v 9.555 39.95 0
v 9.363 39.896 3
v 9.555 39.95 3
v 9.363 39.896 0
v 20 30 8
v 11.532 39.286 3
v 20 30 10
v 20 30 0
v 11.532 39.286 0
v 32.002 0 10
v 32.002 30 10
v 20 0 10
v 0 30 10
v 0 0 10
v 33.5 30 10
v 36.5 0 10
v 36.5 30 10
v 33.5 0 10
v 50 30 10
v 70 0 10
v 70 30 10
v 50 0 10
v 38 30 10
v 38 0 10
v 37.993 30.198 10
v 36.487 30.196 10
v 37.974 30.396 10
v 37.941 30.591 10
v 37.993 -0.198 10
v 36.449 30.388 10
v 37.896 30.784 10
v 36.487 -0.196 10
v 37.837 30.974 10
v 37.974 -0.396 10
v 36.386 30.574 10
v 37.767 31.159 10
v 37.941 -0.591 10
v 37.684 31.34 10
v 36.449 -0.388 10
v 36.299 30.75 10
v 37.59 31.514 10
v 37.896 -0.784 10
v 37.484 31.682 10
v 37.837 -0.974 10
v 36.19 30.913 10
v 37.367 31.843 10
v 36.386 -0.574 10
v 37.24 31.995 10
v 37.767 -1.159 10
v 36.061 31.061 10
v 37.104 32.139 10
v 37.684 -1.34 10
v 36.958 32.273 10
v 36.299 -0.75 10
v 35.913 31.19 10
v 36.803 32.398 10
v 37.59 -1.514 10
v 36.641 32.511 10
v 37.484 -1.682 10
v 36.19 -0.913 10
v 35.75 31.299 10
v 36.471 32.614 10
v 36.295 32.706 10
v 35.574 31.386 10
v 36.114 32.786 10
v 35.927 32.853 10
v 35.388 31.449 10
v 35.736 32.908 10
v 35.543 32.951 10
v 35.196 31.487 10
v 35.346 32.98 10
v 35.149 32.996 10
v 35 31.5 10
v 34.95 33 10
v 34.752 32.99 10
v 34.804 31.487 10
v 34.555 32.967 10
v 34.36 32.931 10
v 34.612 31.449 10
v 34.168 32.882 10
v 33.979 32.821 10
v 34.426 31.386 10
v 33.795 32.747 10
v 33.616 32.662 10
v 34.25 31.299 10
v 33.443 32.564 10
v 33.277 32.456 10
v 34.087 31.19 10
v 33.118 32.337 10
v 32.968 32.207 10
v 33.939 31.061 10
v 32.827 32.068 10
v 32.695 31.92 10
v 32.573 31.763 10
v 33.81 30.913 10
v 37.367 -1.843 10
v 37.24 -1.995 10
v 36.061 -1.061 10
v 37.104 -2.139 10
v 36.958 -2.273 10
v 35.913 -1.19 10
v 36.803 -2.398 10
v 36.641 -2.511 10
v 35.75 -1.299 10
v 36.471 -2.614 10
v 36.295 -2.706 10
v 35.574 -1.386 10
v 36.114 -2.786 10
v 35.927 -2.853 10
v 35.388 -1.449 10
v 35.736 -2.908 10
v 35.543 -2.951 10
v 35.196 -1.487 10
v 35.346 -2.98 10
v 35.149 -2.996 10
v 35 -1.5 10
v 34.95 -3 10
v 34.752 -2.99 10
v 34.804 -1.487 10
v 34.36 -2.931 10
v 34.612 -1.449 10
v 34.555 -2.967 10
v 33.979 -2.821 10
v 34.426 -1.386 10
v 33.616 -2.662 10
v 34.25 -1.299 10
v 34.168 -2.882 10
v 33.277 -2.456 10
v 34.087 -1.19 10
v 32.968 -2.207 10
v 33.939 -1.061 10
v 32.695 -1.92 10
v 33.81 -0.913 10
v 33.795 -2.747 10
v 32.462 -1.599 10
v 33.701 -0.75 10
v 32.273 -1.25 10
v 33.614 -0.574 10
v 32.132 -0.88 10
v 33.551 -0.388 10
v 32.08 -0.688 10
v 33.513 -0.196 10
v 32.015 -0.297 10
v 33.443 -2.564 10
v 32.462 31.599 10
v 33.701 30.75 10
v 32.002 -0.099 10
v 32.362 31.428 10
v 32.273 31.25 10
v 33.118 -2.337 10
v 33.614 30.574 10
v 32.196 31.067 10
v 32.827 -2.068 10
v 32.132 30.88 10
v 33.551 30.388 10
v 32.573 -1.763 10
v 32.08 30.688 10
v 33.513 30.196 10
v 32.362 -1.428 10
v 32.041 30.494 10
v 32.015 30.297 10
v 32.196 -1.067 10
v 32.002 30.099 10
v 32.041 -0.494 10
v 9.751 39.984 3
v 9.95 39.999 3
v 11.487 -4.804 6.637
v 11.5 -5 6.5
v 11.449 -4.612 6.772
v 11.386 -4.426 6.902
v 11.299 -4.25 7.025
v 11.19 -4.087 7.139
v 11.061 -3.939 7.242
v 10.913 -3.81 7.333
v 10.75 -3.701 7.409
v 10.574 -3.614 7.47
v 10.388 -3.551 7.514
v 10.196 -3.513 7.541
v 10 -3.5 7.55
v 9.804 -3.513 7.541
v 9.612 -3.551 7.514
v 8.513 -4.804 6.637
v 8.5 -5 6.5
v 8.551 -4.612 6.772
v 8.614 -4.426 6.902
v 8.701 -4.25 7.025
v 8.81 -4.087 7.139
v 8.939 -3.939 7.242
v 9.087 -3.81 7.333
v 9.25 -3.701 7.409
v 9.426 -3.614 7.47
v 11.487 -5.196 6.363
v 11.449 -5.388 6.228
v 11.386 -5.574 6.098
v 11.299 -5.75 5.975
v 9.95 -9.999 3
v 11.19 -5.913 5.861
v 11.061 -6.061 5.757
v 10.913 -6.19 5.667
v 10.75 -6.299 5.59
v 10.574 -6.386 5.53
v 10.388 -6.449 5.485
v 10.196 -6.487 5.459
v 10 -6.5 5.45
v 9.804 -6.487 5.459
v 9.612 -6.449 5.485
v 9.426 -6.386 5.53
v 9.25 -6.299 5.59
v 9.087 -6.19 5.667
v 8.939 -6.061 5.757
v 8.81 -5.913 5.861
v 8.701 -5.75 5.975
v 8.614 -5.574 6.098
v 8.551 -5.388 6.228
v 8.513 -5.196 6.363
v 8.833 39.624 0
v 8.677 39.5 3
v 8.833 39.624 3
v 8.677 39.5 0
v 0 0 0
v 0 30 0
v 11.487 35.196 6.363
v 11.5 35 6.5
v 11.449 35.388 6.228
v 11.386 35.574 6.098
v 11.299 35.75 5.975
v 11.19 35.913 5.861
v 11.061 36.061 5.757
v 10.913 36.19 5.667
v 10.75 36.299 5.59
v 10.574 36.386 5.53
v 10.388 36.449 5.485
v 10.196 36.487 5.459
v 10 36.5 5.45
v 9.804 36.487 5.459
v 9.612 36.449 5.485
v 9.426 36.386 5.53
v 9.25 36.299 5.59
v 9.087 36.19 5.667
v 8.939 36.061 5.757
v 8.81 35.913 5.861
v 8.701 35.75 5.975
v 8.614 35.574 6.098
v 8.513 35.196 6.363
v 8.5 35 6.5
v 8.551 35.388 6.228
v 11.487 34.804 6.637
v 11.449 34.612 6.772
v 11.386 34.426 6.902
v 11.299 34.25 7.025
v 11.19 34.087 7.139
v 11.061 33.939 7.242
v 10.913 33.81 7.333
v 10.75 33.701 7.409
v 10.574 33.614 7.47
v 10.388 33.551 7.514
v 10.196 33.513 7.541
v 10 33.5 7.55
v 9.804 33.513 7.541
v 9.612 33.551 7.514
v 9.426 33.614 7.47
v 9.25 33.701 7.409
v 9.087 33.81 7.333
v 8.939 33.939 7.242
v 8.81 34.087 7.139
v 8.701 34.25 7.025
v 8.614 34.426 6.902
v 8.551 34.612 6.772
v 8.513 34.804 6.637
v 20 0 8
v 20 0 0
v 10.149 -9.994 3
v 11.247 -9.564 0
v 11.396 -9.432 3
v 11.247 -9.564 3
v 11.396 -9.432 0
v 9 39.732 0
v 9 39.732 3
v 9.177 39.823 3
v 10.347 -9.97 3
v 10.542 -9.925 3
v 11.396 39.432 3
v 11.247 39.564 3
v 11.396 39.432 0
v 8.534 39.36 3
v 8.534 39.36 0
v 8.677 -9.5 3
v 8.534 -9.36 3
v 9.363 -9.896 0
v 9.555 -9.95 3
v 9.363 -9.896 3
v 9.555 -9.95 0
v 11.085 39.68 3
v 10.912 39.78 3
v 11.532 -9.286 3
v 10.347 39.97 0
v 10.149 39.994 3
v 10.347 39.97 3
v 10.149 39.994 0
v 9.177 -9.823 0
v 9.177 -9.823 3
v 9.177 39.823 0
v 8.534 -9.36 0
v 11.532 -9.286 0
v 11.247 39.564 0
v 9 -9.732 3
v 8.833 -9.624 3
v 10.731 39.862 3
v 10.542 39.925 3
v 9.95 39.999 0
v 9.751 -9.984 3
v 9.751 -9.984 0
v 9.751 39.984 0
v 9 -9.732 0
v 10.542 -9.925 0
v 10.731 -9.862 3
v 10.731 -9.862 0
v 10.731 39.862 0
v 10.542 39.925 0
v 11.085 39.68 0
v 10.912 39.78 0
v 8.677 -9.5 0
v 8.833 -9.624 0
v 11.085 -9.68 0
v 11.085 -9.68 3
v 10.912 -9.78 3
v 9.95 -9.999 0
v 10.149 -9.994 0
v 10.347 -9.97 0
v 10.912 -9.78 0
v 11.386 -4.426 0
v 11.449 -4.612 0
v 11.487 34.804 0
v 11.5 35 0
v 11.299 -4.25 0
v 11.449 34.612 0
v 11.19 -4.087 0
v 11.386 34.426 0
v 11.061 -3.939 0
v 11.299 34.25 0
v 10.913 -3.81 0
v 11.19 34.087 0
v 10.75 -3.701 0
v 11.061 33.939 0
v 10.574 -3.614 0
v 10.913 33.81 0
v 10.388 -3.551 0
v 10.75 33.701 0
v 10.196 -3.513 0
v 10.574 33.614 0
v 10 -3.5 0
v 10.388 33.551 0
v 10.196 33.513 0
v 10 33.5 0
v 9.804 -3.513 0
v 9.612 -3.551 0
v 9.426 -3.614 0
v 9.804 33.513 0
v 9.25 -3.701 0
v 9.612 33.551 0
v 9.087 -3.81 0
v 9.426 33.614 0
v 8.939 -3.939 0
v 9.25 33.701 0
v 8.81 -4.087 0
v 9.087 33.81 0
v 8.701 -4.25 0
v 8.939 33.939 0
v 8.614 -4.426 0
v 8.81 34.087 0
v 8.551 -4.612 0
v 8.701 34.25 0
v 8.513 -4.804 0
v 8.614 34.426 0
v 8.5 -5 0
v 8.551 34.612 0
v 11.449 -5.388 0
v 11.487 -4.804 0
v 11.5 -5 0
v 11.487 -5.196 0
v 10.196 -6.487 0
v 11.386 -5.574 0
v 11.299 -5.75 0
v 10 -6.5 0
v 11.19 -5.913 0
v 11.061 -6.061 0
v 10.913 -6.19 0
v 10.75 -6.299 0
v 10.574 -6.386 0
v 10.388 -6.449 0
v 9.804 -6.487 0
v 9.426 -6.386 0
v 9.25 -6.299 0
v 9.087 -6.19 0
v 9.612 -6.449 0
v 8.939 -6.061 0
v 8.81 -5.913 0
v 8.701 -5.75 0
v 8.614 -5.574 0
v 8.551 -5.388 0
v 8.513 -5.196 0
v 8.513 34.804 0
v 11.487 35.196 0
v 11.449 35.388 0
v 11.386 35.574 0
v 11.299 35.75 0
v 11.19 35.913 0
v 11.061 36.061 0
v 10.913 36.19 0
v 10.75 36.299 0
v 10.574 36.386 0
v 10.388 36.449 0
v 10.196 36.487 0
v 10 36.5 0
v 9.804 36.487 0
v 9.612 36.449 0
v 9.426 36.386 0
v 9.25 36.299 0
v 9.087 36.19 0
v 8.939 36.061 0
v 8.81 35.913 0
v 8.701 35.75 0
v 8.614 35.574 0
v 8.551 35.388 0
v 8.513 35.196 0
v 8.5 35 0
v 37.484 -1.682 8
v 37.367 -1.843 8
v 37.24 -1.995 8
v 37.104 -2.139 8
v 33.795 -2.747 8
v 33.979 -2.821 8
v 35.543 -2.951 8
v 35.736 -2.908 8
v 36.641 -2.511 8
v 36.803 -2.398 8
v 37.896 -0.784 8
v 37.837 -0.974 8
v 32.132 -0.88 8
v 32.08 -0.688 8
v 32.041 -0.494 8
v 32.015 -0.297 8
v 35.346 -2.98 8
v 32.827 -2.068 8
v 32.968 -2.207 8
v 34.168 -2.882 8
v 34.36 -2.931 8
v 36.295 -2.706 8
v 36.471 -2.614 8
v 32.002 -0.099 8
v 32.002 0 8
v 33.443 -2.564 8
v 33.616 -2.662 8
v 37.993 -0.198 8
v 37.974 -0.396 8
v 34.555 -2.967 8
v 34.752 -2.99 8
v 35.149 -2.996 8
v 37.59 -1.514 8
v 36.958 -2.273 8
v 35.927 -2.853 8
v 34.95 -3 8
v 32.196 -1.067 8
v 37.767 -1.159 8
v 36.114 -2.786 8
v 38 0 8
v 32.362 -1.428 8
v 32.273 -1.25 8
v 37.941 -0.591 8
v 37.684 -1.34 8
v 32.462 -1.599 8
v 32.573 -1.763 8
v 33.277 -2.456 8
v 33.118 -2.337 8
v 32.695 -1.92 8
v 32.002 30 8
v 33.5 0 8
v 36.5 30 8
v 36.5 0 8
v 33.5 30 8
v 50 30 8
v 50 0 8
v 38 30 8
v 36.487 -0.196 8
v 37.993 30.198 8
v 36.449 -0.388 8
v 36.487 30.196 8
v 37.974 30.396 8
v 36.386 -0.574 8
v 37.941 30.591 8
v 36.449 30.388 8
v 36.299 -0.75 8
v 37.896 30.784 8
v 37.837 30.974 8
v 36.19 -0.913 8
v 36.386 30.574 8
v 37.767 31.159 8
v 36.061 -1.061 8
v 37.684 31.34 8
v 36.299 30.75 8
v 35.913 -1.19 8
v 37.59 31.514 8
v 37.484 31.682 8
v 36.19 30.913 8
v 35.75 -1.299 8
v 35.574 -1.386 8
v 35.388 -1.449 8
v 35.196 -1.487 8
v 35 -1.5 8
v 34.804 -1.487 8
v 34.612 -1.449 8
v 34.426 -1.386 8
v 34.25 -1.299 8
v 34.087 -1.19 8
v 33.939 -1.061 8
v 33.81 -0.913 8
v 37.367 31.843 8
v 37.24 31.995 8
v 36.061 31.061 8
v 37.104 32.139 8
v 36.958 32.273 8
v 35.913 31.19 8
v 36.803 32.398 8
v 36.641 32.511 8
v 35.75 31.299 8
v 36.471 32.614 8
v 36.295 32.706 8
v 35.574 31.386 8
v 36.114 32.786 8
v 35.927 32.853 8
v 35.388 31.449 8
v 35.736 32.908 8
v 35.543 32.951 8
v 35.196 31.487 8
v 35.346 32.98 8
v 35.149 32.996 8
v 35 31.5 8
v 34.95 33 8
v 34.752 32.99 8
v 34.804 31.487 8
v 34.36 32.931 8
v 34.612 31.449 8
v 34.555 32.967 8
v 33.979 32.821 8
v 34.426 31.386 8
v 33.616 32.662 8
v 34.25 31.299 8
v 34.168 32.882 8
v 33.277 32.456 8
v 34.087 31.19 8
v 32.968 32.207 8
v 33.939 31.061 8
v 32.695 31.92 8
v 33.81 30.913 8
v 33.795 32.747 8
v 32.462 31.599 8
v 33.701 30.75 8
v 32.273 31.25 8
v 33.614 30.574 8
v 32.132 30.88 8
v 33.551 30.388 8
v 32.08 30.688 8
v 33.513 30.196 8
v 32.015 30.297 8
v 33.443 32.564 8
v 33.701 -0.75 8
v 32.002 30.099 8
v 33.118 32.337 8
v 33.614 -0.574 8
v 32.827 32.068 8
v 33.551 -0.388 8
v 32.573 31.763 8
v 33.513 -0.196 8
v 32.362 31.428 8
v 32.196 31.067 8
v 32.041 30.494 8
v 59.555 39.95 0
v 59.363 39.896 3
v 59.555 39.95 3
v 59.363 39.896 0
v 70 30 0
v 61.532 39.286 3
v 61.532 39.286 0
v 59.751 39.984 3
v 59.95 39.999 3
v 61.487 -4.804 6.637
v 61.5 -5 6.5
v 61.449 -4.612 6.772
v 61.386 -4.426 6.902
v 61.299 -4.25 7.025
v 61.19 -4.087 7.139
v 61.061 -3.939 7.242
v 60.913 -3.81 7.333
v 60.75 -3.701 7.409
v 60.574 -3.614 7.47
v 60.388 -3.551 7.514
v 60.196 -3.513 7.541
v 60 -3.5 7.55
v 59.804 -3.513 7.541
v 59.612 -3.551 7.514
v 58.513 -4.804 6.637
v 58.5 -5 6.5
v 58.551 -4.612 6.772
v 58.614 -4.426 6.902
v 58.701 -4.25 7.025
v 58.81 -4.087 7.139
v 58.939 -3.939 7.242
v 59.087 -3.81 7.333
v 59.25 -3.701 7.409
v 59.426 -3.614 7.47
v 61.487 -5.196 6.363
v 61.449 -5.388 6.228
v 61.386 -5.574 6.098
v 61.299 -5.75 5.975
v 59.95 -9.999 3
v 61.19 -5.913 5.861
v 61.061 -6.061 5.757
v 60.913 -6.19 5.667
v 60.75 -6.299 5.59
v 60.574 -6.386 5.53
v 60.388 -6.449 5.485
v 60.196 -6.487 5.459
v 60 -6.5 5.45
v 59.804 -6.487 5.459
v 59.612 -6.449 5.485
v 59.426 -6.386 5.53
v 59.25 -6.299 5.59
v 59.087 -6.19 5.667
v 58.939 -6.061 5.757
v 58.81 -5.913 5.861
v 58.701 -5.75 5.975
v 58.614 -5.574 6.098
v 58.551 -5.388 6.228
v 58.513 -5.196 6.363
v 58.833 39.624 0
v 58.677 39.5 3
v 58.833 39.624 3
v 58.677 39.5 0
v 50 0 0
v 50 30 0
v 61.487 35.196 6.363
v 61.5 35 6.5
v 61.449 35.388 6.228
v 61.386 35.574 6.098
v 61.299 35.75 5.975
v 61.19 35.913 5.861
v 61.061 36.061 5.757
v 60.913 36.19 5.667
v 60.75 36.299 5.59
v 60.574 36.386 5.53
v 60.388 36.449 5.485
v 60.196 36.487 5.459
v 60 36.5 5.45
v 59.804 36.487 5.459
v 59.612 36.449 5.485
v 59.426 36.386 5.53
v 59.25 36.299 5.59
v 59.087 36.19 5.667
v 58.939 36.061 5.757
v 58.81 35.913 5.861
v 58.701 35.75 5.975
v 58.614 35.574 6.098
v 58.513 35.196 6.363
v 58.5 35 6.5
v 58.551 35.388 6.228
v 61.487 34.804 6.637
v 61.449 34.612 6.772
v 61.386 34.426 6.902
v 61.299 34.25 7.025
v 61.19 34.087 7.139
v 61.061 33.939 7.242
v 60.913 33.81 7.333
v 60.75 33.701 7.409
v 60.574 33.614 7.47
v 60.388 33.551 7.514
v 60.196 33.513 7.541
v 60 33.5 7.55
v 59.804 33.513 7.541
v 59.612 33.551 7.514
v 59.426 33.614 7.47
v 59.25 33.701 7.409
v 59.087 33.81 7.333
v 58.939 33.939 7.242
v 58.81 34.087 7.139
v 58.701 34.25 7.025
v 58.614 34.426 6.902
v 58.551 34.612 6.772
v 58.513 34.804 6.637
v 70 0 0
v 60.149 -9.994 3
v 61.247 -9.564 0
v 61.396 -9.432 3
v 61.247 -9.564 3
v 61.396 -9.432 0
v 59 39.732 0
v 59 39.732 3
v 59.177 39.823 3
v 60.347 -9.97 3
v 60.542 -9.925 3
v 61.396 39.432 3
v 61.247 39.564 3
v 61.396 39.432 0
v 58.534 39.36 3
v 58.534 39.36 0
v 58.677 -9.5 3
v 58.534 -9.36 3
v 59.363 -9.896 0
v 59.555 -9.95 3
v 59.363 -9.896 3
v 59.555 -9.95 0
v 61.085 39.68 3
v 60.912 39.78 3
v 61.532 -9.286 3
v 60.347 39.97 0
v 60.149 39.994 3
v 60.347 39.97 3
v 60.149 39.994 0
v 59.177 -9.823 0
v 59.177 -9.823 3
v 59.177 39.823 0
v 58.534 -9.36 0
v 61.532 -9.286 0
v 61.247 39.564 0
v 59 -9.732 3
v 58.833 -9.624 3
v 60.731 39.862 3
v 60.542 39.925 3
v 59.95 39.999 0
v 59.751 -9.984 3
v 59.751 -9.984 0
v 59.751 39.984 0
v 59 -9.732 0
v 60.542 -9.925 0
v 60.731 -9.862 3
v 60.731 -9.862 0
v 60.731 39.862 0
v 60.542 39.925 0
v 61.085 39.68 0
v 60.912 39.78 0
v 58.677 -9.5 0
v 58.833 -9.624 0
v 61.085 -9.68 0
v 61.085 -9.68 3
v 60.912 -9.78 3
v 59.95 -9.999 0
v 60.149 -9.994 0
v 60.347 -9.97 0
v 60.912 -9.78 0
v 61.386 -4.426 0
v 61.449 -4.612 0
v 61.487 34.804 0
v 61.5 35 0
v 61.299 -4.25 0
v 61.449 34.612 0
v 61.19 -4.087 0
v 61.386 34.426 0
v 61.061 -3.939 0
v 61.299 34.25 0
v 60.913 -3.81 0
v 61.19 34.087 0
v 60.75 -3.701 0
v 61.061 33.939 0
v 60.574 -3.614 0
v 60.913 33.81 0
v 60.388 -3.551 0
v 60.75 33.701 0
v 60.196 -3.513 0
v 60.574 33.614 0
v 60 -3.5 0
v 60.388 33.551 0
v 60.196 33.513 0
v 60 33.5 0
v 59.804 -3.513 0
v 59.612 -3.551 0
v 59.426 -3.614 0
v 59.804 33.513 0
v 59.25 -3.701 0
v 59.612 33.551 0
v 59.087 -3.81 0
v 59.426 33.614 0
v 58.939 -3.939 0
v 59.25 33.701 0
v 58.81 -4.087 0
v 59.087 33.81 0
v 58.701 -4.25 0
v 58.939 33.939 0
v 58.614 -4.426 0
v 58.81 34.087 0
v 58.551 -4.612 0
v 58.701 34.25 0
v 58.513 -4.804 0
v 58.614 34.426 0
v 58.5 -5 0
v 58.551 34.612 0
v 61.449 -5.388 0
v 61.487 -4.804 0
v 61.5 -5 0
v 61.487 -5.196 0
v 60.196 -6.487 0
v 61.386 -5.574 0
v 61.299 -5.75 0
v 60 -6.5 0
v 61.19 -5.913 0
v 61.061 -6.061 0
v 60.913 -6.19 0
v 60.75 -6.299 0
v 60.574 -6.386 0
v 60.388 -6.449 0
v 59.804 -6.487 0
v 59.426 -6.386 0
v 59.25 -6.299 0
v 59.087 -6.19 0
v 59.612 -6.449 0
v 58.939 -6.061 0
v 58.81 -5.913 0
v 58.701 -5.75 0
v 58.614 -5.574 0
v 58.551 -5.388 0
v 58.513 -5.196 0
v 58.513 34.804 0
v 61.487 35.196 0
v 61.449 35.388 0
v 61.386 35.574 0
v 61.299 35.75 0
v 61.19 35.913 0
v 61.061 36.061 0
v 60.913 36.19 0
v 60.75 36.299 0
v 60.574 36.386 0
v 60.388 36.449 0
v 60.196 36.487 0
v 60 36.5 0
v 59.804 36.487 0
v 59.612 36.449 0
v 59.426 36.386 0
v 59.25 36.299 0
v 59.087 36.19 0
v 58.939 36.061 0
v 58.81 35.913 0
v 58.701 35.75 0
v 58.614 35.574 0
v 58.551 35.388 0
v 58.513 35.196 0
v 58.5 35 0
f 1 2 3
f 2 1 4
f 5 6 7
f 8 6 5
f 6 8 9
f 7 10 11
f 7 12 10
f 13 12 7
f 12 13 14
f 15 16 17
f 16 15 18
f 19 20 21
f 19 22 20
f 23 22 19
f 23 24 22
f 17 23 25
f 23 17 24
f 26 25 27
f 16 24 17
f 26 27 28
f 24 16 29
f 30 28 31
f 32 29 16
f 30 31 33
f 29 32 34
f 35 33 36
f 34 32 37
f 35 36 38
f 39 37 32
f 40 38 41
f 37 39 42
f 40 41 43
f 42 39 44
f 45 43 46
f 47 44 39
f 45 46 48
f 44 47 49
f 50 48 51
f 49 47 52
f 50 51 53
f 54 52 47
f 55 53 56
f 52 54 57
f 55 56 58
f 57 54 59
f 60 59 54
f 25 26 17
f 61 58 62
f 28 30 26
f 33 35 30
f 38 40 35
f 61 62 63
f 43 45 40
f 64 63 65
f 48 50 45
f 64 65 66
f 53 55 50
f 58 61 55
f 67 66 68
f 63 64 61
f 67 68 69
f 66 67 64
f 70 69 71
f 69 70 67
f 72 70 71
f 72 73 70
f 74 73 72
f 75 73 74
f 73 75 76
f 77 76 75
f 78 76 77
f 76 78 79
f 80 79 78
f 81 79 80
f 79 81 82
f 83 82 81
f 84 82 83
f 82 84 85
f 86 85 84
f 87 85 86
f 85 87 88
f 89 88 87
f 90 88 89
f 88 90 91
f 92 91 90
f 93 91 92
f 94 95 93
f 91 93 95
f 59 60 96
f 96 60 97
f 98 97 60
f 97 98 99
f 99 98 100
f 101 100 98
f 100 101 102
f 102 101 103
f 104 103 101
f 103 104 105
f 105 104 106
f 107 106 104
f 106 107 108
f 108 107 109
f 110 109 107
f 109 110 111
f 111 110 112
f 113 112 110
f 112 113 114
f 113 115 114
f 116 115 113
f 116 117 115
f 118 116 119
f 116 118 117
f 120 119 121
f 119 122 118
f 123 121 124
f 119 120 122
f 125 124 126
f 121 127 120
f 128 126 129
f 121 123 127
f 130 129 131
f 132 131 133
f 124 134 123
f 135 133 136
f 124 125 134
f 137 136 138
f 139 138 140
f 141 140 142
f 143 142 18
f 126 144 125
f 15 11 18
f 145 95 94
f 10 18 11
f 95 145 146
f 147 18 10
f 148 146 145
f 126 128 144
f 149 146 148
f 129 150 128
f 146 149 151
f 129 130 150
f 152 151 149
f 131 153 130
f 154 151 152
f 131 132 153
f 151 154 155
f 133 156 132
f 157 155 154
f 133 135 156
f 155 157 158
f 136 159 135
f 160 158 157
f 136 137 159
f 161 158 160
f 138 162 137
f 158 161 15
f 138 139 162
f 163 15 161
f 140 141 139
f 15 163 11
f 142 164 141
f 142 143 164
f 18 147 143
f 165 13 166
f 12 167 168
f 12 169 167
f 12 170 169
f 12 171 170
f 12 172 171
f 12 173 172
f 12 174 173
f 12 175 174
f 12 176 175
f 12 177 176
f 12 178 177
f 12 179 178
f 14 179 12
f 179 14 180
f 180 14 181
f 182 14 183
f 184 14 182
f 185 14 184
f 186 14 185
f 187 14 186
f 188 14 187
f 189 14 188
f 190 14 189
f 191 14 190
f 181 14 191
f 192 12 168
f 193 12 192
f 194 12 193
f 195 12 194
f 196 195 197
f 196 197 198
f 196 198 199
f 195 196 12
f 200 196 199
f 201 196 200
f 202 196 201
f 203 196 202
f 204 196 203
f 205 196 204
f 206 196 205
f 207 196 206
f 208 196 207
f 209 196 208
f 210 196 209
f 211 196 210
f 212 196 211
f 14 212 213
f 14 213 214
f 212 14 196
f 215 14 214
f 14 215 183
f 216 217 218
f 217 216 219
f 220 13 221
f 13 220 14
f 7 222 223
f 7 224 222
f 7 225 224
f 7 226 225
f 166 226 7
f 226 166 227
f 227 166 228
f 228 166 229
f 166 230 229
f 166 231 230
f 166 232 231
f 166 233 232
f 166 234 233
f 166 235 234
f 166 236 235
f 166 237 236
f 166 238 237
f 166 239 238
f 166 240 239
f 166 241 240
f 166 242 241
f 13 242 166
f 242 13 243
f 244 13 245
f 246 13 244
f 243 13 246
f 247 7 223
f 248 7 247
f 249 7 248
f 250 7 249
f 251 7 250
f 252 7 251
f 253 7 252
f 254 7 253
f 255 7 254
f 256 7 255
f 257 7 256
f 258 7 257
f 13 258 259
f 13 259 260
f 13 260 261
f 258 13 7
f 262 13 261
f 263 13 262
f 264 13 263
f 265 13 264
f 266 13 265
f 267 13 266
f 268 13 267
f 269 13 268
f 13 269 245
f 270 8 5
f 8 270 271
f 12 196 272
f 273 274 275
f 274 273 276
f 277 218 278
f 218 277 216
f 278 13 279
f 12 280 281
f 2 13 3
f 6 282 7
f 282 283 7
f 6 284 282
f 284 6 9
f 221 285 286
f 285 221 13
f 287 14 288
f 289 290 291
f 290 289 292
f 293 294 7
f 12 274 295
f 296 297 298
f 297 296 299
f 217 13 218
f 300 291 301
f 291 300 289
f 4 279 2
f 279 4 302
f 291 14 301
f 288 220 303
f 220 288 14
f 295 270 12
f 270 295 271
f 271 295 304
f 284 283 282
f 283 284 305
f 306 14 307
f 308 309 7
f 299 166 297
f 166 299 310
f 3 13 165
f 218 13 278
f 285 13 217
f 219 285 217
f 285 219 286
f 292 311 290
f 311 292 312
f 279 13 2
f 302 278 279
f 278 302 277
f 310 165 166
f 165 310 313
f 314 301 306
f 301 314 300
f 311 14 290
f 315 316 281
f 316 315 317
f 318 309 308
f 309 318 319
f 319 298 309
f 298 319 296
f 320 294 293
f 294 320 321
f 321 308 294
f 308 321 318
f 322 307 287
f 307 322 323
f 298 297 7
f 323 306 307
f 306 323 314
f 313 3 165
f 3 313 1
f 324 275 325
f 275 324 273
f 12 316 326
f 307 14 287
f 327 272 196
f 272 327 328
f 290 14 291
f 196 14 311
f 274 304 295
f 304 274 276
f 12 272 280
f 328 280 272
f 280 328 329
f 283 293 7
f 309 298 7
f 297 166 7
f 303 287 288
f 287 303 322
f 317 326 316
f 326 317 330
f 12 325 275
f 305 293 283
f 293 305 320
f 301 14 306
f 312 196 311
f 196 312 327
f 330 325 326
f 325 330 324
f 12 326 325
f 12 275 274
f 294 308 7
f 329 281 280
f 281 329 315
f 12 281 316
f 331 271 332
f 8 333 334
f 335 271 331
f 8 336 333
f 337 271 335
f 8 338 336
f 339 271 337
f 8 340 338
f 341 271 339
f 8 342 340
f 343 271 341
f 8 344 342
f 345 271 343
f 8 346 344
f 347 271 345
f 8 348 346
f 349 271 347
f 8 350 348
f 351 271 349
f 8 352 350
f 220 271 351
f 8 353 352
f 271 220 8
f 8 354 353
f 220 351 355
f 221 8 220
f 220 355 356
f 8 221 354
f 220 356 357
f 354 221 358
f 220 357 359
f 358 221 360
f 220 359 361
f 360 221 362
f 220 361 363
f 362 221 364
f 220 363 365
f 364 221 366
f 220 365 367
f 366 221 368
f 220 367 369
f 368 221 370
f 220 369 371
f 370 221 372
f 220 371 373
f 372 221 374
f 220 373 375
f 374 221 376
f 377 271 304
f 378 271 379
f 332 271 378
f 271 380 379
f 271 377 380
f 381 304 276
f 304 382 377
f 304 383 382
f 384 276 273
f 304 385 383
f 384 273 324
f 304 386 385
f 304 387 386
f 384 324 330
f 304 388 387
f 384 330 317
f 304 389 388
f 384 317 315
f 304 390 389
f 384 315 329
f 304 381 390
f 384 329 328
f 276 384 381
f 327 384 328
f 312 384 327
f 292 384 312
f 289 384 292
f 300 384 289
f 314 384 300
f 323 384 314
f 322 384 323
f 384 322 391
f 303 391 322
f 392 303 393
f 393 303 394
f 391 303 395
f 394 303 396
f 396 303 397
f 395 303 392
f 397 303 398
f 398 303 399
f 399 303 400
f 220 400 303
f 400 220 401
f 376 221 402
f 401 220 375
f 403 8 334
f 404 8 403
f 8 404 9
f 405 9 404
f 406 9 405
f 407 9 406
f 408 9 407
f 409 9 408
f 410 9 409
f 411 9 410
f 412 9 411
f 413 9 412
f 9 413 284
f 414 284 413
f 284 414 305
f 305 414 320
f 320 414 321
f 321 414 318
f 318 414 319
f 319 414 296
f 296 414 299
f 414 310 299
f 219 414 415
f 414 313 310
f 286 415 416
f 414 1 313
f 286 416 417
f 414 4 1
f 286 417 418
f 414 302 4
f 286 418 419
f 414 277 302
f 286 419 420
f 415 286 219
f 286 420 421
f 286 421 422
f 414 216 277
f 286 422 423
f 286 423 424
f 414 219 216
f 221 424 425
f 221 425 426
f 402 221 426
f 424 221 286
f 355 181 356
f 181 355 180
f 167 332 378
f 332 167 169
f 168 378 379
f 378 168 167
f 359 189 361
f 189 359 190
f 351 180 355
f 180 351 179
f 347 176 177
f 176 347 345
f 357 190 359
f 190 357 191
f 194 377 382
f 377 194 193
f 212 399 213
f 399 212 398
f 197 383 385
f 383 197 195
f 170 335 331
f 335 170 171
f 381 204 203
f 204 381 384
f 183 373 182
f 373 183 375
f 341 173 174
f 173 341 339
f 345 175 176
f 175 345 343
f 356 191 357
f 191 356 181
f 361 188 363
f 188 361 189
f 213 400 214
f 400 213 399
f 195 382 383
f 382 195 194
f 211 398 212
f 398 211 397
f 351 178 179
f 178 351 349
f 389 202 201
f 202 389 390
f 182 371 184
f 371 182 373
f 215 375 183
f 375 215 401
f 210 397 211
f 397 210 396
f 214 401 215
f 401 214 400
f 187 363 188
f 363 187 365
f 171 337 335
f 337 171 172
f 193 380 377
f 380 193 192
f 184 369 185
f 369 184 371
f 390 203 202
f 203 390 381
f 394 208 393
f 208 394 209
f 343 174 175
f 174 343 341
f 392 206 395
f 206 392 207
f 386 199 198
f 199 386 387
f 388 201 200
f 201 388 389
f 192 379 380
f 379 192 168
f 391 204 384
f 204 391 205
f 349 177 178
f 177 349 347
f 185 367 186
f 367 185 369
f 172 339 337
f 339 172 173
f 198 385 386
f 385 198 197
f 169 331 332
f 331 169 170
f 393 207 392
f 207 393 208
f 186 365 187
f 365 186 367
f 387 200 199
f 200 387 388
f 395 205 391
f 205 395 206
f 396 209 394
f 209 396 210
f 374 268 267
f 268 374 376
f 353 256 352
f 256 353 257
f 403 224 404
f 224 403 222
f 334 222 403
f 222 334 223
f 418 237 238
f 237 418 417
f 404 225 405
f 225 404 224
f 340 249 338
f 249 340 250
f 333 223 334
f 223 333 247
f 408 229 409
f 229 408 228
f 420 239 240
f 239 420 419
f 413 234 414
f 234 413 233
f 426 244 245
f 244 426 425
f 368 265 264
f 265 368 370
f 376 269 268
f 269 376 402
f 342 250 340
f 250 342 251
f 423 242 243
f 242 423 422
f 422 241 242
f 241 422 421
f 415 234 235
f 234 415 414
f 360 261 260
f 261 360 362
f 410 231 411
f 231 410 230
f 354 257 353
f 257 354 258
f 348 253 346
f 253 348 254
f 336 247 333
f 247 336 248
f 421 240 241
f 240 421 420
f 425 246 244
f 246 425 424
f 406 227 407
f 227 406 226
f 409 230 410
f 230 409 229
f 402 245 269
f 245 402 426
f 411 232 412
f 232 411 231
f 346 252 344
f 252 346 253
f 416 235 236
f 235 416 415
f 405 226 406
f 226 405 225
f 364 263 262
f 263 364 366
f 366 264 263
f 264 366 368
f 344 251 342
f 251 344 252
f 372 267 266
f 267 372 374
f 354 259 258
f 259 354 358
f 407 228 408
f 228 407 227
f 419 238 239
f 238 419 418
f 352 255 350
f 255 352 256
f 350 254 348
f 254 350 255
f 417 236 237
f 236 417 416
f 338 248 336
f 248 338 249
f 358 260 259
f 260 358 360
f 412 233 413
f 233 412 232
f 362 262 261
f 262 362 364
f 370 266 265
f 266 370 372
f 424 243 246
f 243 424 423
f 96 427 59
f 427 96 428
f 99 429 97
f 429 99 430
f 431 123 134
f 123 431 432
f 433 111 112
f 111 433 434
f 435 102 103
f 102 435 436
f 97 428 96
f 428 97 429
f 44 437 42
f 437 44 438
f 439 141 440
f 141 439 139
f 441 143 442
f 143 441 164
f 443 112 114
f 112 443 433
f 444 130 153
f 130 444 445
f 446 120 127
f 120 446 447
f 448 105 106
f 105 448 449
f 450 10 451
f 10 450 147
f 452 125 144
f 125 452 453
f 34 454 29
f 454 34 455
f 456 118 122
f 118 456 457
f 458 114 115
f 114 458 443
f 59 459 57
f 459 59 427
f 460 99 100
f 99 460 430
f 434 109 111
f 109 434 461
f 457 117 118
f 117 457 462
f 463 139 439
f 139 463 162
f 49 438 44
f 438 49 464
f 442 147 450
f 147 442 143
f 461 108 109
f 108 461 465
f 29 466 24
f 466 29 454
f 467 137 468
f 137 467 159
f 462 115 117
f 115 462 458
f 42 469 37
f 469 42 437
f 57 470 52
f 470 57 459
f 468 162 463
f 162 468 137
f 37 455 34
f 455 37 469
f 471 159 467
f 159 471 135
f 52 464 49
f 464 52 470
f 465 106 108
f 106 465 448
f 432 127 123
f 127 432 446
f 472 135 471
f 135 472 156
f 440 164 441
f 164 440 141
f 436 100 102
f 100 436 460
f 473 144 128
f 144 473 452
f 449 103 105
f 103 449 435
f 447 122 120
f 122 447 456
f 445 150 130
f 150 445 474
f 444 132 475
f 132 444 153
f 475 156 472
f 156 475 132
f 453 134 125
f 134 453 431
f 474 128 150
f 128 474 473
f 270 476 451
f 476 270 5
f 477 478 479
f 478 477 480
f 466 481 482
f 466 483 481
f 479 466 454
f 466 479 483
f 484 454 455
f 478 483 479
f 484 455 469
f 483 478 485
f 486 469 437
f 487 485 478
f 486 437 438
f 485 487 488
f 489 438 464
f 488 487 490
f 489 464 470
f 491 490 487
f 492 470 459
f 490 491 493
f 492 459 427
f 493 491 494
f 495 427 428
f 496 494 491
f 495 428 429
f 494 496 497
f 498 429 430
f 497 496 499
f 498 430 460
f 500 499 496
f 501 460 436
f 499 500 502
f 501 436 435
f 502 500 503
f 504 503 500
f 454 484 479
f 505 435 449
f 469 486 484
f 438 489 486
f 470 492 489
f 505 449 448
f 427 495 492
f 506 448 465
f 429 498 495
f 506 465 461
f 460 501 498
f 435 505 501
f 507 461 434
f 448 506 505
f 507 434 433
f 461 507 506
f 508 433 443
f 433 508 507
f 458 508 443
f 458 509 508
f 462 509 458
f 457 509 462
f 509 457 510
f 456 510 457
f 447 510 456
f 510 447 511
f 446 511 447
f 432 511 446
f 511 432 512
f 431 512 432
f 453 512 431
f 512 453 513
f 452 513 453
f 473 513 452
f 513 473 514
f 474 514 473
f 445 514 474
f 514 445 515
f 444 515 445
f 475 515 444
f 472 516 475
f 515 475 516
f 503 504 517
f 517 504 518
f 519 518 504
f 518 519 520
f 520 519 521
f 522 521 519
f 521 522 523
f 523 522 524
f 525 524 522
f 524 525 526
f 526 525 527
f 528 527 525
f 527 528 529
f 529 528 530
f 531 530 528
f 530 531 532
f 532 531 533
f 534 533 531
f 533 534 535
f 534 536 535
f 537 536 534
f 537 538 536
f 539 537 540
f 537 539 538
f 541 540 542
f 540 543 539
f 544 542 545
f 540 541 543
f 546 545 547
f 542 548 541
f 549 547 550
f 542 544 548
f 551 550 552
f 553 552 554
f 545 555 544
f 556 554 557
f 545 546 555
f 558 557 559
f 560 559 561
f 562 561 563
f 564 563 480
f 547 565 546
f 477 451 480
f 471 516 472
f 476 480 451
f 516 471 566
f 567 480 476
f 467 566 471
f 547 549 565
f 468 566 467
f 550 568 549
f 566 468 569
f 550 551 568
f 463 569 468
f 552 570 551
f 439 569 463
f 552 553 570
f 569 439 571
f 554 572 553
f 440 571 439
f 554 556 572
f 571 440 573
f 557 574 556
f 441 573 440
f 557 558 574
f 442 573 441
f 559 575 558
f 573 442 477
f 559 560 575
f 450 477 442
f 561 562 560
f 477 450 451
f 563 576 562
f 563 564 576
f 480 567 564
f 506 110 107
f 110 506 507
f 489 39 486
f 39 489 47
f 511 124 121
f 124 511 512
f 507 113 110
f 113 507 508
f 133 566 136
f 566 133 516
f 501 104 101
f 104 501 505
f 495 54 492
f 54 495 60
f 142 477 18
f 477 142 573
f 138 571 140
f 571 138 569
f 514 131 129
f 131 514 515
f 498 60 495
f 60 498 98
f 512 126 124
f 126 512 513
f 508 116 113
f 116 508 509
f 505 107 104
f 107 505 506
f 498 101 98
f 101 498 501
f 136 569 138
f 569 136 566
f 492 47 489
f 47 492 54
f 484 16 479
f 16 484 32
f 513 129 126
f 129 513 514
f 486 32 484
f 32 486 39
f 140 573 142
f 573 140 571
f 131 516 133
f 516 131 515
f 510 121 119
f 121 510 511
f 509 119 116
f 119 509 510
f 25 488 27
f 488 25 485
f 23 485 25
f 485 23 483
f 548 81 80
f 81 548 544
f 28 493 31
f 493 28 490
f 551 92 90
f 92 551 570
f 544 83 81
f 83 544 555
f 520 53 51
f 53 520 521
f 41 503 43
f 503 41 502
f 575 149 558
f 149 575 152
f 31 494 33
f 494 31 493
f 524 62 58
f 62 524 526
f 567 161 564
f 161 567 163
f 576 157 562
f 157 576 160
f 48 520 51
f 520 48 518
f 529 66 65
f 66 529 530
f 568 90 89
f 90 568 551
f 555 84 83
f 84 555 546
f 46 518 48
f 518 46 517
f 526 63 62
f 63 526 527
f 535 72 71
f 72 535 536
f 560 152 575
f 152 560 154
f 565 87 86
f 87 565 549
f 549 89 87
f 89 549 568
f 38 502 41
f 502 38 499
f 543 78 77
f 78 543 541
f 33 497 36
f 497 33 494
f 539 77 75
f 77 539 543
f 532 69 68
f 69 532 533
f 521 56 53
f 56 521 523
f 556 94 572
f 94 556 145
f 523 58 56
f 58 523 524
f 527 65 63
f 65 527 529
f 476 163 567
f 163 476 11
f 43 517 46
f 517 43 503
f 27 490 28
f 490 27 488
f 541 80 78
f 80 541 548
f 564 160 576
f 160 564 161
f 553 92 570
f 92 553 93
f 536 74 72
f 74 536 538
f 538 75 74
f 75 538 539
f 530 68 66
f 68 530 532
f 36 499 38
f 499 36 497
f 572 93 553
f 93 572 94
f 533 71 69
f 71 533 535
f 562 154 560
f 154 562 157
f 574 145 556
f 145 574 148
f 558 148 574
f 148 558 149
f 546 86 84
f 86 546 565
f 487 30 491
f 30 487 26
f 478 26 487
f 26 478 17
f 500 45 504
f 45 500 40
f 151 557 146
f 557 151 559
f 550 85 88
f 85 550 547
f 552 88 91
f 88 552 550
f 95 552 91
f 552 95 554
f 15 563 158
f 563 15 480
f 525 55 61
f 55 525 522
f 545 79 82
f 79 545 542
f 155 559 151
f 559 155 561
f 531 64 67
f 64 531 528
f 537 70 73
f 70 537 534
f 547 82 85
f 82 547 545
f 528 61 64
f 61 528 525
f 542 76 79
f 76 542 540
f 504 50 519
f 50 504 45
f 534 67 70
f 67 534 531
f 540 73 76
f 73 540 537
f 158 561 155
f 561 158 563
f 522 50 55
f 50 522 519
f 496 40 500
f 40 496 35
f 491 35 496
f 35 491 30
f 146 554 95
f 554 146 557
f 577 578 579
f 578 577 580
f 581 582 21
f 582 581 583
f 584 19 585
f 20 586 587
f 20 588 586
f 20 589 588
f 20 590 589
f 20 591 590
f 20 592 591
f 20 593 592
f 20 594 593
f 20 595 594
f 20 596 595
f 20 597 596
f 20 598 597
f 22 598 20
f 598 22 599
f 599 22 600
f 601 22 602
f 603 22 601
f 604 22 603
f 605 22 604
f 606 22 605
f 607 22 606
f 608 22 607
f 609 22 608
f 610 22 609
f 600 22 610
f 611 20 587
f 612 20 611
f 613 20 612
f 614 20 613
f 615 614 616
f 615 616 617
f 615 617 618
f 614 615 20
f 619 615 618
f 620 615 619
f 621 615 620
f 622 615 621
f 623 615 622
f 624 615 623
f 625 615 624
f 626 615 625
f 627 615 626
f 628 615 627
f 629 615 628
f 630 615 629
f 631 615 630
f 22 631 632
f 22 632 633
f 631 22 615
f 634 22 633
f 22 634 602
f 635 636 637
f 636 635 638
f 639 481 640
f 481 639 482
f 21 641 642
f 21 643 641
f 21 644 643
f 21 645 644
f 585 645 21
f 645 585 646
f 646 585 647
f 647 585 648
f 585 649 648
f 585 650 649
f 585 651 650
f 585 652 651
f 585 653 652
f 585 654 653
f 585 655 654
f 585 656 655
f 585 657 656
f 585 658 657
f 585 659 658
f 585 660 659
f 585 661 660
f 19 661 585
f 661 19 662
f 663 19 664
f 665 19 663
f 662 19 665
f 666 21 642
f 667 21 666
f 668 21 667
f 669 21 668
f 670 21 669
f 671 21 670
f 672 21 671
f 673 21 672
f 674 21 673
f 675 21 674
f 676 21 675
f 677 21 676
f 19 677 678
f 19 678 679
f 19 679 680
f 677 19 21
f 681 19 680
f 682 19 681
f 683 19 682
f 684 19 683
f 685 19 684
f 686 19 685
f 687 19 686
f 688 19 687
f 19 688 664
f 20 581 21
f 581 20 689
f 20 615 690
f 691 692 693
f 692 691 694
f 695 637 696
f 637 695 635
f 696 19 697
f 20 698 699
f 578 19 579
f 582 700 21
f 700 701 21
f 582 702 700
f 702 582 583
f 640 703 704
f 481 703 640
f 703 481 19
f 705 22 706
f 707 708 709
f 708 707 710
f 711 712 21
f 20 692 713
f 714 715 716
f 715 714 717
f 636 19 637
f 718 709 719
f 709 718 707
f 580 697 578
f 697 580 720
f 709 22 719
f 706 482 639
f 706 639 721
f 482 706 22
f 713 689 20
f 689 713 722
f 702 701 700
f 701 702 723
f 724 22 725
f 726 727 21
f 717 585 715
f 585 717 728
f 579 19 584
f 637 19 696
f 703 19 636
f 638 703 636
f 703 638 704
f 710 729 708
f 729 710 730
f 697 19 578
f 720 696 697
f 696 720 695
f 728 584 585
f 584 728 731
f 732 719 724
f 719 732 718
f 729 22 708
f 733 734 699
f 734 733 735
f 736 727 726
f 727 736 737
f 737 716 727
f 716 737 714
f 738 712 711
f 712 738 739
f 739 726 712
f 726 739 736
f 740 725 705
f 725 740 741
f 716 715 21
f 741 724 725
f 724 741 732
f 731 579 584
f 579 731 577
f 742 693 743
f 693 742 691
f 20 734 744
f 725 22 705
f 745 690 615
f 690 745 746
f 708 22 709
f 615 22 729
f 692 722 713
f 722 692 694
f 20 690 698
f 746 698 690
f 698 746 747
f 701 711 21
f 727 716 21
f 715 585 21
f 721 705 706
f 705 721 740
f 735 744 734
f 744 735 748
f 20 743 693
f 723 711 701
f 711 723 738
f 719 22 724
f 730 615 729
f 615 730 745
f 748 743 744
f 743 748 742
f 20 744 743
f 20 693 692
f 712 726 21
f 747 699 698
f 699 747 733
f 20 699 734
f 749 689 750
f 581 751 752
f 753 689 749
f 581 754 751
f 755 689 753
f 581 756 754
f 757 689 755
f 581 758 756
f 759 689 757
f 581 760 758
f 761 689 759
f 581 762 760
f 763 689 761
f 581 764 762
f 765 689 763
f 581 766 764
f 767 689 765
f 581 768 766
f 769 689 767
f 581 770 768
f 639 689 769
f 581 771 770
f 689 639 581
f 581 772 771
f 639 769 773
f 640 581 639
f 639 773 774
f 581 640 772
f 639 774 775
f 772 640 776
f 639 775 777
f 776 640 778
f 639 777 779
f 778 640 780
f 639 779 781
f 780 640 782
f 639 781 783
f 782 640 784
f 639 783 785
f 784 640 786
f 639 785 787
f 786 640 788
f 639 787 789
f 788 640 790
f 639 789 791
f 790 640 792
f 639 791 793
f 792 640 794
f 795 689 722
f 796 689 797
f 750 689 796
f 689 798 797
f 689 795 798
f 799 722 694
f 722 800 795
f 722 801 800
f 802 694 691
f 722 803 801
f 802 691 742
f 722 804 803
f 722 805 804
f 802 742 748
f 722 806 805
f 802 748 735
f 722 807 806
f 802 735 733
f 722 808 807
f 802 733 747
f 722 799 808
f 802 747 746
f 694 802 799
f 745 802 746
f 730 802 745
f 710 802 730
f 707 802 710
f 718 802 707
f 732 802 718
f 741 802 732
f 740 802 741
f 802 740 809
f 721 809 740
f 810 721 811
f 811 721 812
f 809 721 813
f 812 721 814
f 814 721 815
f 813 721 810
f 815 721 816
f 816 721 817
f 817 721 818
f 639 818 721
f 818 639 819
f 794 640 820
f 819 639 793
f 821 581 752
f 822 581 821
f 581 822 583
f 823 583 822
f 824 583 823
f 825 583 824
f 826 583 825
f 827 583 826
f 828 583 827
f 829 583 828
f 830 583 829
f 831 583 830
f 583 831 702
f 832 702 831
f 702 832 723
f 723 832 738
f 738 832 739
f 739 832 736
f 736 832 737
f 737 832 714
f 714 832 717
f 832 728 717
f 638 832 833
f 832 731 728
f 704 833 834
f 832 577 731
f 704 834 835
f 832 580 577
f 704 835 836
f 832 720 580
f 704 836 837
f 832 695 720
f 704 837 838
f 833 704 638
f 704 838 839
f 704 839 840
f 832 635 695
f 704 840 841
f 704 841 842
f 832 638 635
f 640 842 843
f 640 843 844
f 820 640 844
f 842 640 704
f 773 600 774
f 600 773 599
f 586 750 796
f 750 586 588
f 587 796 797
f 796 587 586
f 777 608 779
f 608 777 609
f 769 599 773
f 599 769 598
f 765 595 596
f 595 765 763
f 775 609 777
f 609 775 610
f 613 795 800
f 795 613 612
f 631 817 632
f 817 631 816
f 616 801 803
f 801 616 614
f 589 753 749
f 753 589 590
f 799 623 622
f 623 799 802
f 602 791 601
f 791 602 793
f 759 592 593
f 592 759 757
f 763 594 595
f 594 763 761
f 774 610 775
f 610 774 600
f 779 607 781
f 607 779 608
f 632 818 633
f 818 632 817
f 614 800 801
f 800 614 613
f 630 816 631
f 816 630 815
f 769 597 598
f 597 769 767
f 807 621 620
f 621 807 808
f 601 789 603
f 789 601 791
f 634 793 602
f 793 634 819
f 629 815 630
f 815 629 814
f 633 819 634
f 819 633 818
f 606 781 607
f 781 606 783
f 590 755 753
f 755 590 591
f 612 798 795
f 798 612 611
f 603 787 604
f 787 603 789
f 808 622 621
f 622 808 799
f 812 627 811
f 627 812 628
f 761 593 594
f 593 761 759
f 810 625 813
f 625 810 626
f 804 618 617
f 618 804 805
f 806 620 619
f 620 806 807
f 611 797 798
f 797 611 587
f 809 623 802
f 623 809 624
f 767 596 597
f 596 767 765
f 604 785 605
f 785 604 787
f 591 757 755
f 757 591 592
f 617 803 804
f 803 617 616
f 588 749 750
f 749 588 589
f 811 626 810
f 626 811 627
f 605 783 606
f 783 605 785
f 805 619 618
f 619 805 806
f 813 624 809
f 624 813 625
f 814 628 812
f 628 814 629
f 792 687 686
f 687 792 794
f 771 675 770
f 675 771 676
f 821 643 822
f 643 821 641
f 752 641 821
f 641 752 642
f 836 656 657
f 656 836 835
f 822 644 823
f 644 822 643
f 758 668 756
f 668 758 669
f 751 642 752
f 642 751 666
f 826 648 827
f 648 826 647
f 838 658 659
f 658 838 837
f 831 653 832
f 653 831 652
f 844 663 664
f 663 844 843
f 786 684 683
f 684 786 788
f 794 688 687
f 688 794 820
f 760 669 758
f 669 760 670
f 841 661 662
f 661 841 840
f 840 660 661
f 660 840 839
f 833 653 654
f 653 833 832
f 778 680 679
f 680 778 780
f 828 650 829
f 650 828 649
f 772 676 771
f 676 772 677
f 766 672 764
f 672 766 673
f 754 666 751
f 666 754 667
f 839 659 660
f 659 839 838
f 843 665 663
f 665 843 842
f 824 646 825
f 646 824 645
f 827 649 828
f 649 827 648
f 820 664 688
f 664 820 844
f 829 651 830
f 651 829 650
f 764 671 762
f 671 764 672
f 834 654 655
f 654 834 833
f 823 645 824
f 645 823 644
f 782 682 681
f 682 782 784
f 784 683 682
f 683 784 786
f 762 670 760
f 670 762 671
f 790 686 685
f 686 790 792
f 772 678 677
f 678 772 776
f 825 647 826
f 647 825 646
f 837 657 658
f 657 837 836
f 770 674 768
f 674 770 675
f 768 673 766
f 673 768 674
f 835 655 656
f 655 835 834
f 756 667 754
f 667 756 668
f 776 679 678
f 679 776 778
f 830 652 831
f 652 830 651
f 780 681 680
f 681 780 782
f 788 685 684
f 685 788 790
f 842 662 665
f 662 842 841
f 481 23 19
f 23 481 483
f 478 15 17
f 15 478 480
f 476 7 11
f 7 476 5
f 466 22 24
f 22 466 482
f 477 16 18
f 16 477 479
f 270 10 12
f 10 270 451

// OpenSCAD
plate_width = 20;
plate_length = 30;
plate_point_size = 10;
bridge_size = 30;

$fs = 0.2;
$fa = 1;

module bolted_plate() {
	difference() {
		hull() {
			cube([plate_width, plate_length, 10]);
			translate([plate_width / 2, -plate_point_size + 2, 0]) {
				cylinder(r=2, h=3);
			}
			translate([plate_width / 2, plate_length + plate_point_size - 2, 0]) {
				cylinder(r=2, h=3);
			}
		}
		translate([plate_width / 2, -plate_point_size / 2, 0]) {
			cylinder(r=1.5, h=10);
		}
		translate([plate_width / 2, plate_length + plate_point_size / 2, 0]) {
			cylinder(r=1.5, h=10);
		}
	}
}

bolted_plate();
translate([plate_width, 0, 8]) {
	cube([bridge_size, plate_length, 2]);
}
translate([plate_width + bridge_size / 2, 0, 8]) {
	difference() {
		cylinder(r=3, h=2);
		cylinder(r=1.5, h=2);
	}
	translate([0, plate_length, 0]) {
		difference() {
			cylinder(r=3, h=2);
			cylinder(r=1.5, h=2);
		}
	}
}
translate([plate_width + bridge_size, 0, 0]) {
	bolted_plate();
}
